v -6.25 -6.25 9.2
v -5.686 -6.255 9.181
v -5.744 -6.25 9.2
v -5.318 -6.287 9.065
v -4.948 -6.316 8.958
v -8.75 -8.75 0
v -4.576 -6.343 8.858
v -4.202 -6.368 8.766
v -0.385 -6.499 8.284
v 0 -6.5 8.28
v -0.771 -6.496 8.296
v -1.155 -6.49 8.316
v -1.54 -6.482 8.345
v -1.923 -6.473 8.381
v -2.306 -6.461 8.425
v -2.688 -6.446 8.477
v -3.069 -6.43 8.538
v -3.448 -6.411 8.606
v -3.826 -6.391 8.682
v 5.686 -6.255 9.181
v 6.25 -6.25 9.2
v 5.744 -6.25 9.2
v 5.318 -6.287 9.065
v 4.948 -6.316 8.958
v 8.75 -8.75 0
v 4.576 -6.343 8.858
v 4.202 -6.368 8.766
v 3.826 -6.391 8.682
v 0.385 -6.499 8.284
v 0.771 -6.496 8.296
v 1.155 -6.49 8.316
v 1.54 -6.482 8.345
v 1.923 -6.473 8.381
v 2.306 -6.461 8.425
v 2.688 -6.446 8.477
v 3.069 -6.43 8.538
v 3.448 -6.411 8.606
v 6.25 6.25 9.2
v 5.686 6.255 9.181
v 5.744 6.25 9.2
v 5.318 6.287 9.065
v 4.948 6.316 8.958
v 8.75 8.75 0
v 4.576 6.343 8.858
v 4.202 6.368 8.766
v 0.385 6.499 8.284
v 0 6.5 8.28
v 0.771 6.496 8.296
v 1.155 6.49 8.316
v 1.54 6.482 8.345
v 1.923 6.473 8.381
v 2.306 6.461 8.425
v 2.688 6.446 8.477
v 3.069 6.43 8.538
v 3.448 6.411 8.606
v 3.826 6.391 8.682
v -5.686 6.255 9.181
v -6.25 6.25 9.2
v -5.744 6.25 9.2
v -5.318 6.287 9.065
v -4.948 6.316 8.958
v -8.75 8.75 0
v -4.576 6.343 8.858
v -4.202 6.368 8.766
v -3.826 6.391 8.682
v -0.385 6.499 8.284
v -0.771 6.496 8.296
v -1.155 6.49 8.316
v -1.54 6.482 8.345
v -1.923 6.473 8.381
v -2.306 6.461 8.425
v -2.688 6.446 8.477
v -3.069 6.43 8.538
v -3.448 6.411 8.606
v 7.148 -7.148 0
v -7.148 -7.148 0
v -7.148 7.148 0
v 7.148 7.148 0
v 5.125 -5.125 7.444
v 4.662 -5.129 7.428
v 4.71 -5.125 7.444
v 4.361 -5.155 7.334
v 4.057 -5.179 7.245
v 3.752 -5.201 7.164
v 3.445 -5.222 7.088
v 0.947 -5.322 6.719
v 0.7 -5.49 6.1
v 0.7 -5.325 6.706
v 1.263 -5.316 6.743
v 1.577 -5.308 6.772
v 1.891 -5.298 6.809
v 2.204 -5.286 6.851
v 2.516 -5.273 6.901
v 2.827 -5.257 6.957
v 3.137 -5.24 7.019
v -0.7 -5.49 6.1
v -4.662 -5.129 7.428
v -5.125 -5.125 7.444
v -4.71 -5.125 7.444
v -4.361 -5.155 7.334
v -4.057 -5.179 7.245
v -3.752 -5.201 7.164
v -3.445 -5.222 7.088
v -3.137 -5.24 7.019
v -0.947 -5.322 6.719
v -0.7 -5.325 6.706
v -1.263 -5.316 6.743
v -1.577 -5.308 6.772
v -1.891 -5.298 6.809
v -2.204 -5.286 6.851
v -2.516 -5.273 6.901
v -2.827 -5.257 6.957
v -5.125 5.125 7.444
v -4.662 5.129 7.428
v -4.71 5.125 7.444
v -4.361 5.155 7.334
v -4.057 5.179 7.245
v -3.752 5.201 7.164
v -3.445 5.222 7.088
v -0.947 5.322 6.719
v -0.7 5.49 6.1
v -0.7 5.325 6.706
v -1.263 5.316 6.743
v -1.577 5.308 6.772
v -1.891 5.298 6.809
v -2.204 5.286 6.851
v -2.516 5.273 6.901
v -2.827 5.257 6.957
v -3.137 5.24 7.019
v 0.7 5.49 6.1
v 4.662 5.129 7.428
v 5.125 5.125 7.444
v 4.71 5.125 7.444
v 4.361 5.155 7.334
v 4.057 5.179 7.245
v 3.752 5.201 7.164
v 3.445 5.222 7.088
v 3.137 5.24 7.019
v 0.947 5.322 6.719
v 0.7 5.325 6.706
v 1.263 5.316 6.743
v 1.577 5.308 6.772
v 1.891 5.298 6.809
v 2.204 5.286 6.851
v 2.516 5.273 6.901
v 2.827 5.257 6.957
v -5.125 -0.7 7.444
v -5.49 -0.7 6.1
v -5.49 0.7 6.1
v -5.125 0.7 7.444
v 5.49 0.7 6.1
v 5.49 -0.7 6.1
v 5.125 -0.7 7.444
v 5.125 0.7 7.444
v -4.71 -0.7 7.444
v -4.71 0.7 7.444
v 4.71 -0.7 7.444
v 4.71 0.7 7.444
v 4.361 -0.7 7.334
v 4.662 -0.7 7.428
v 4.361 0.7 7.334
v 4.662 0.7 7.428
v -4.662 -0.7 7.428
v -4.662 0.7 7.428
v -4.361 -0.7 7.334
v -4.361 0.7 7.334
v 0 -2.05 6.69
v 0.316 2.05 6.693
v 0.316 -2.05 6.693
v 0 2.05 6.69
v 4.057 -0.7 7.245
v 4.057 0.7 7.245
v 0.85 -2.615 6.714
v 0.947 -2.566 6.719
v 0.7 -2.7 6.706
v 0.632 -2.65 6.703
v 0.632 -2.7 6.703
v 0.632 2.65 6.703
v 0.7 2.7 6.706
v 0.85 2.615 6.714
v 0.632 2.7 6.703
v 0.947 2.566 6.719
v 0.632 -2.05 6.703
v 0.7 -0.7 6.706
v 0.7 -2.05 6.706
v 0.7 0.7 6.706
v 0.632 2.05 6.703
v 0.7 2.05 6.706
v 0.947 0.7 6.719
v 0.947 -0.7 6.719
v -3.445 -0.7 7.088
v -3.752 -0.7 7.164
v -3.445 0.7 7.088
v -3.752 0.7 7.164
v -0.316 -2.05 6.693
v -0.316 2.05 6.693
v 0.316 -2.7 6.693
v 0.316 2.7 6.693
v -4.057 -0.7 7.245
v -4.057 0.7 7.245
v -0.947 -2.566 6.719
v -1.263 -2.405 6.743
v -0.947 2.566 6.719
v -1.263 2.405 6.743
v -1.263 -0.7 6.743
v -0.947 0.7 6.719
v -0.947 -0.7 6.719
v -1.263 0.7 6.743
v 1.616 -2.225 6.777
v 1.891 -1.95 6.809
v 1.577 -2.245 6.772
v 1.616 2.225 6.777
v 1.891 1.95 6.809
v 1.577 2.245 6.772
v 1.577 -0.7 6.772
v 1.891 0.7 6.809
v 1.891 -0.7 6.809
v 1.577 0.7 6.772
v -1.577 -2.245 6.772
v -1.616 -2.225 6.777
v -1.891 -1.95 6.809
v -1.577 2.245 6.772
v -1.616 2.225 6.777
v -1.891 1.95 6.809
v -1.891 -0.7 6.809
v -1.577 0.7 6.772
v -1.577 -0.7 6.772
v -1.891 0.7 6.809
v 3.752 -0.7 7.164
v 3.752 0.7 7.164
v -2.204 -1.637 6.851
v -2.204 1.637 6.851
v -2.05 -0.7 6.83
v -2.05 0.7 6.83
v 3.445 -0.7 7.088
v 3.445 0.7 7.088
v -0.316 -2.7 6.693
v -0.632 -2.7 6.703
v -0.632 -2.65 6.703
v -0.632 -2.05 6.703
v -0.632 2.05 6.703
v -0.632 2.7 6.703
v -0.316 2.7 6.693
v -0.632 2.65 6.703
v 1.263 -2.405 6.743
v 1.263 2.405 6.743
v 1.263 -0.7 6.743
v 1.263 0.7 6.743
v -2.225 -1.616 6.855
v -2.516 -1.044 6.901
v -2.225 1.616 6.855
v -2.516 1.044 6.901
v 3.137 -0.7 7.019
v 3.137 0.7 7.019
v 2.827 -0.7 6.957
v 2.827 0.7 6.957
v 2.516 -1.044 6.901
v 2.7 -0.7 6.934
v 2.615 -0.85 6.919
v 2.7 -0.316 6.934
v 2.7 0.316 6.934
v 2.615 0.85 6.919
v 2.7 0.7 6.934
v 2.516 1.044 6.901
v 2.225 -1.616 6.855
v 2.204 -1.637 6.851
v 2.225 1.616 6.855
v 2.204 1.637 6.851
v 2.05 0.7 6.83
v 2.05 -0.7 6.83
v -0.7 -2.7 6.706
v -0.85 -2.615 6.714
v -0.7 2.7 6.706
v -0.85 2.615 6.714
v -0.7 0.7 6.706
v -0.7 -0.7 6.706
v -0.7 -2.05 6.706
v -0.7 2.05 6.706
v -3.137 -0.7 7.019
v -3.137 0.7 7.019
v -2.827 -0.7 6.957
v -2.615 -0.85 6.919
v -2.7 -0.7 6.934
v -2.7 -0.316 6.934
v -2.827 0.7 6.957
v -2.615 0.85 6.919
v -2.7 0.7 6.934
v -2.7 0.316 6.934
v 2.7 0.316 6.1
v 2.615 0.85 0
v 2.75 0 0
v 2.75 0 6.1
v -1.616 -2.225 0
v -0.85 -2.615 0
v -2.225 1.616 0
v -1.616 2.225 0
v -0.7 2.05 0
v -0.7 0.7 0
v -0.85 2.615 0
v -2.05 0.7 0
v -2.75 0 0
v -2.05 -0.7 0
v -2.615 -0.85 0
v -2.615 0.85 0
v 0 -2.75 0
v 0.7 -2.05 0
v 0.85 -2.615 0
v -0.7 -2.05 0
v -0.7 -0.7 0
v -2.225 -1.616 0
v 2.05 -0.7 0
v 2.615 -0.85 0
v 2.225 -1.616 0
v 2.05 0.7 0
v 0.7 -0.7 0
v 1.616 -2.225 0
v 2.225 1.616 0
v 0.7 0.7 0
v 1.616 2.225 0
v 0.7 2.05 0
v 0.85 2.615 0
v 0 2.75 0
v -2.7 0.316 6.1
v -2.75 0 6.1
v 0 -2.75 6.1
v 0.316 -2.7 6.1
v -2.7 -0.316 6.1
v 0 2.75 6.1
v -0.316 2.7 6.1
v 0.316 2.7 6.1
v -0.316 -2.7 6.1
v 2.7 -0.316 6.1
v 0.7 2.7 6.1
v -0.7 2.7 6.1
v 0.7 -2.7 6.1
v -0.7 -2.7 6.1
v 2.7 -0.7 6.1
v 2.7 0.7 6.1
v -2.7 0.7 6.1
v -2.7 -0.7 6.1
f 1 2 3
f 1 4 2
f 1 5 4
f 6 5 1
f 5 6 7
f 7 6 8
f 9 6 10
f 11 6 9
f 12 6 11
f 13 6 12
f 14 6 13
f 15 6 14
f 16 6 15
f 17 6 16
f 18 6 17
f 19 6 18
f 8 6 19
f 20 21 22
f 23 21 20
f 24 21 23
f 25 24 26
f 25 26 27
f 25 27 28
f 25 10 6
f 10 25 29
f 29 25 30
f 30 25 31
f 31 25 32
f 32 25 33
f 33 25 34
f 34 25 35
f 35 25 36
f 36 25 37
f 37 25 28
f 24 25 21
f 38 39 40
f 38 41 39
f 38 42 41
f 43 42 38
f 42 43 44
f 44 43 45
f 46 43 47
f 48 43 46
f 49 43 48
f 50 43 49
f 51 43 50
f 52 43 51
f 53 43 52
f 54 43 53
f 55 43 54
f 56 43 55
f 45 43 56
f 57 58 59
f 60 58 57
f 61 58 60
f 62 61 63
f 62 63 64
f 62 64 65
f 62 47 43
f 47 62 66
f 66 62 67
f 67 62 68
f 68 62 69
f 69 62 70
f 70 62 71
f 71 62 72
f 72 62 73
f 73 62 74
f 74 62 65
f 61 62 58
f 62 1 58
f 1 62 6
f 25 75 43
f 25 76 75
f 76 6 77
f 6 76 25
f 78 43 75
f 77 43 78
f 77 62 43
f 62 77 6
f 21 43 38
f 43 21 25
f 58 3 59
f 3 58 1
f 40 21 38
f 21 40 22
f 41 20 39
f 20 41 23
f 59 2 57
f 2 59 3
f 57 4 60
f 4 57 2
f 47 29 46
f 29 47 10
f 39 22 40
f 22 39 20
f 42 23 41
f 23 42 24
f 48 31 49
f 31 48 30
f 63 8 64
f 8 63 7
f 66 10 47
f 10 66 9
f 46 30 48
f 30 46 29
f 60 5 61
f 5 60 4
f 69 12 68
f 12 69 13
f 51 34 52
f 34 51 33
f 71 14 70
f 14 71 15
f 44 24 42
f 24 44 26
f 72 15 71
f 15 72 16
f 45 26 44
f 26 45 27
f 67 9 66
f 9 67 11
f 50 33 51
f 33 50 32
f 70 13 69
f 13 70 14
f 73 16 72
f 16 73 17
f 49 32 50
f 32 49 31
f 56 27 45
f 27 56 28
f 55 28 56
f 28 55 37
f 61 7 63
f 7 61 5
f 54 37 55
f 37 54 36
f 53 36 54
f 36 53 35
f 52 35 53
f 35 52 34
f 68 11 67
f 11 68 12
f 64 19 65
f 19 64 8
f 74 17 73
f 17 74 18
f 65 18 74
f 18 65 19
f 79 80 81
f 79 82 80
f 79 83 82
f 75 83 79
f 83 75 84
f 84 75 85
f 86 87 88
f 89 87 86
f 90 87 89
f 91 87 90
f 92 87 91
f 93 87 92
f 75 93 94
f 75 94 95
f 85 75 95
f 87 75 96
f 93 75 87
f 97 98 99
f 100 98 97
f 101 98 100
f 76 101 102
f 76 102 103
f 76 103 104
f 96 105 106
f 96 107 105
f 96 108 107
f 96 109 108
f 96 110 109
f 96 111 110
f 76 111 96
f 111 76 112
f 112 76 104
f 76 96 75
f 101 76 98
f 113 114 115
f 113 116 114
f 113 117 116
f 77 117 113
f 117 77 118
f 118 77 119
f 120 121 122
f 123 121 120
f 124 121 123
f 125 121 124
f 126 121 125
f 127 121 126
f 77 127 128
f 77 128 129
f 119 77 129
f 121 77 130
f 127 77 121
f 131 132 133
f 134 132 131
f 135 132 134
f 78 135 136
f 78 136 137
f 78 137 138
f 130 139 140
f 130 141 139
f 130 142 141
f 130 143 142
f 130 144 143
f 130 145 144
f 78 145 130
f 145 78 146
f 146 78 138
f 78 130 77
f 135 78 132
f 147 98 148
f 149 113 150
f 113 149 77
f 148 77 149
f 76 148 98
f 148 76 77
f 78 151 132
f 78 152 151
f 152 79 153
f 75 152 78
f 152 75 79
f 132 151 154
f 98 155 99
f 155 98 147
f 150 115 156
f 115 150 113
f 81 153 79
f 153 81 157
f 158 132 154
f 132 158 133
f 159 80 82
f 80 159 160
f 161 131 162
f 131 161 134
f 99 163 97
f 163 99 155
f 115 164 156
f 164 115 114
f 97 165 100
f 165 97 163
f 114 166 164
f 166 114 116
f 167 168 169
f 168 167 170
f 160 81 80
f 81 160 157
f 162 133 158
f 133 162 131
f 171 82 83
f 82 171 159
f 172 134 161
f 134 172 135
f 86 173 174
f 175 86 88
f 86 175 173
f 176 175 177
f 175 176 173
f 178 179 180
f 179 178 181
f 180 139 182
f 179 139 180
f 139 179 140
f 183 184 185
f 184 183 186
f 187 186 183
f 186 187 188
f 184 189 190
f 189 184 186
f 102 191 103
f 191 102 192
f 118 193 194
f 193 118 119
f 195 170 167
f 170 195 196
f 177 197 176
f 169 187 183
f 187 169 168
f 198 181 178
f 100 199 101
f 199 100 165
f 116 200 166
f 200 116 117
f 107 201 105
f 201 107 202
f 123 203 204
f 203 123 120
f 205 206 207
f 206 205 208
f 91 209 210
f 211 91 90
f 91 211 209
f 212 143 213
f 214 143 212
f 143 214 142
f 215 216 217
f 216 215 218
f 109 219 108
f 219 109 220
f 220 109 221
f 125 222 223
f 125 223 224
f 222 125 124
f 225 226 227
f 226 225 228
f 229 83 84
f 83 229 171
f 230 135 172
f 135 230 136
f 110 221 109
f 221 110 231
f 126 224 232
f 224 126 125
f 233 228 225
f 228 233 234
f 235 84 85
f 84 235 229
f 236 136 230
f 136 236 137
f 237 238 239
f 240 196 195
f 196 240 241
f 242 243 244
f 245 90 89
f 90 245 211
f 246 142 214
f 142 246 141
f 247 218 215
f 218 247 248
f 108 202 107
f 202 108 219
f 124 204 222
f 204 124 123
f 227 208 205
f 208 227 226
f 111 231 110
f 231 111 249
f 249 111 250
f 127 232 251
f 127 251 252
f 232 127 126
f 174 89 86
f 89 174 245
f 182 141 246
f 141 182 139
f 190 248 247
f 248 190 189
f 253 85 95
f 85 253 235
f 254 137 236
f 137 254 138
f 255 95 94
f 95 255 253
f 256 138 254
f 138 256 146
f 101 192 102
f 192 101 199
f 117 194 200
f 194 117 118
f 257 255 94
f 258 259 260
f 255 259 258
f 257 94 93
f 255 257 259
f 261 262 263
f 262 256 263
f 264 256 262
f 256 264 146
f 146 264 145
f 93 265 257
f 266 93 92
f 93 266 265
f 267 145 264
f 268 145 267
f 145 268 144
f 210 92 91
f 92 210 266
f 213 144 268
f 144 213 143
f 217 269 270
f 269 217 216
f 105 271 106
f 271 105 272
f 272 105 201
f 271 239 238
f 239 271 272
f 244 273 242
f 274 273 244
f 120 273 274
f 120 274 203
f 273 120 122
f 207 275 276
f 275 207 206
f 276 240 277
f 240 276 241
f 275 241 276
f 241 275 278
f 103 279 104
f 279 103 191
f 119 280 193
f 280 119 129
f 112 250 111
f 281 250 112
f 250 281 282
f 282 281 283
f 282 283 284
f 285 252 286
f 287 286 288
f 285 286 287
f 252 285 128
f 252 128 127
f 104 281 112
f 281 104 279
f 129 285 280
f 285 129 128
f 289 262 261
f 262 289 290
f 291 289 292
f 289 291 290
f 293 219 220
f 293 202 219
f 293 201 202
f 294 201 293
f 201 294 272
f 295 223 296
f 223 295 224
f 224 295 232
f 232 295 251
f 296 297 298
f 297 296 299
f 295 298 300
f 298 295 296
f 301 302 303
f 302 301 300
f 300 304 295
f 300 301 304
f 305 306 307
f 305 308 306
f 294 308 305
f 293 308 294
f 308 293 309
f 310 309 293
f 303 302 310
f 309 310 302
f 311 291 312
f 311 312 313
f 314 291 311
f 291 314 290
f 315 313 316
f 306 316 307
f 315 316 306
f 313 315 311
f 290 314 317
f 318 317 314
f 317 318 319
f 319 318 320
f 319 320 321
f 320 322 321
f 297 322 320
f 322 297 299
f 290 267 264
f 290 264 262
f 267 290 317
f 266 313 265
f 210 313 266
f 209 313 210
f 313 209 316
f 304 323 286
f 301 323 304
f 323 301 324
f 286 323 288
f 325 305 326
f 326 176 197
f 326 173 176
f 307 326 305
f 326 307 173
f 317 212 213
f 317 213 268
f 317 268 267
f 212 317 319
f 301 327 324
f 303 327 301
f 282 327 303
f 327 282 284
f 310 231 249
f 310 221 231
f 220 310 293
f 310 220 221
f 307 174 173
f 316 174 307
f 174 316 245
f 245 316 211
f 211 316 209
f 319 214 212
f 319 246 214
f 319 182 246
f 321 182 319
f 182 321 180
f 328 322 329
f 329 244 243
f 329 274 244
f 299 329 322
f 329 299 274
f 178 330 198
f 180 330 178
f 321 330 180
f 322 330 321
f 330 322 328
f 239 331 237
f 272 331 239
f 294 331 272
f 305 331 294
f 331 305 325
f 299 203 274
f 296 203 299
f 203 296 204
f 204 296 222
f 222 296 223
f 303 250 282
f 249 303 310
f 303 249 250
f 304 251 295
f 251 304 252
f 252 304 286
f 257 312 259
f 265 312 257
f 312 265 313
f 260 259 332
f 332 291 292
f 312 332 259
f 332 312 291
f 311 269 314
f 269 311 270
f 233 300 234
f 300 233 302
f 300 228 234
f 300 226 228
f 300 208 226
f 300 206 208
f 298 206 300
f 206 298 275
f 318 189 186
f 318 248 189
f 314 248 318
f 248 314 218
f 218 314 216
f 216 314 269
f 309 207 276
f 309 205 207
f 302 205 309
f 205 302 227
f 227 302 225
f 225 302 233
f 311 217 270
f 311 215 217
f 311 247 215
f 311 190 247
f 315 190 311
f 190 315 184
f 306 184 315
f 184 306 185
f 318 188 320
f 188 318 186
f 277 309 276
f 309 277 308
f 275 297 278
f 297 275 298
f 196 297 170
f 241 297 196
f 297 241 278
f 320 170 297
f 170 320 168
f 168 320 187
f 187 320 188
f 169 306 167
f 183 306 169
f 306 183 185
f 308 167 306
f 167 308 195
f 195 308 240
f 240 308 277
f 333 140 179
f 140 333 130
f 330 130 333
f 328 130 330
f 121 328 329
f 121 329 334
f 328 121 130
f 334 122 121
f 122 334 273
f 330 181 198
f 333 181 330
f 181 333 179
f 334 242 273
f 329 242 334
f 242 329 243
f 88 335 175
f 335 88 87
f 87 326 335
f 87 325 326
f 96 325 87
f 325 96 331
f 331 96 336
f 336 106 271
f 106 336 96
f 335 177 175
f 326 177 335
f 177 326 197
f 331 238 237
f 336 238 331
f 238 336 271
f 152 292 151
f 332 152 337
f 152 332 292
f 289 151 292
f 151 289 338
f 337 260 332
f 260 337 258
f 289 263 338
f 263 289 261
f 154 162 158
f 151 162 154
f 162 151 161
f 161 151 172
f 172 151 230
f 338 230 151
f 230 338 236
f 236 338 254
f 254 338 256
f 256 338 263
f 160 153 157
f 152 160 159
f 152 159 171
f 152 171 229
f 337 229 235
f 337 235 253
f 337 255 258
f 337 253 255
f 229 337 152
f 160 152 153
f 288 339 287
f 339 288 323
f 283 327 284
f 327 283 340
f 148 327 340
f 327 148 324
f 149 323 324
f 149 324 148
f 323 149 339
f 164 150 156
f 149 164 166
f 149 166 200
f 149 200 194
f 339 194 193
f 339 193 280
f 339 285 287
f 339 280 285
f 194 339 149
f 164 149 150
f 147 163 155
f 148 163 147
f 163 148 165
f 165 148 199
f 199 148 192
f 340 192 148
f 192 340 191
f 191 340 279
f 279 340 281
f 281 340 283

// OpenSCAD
height = 9.2;
top_side = 12.5;
bottom_side = 17.5;
corner_diameter = 2;
stem_diameter=5.5;
inner_hollow_scale = 0.82;

// I'm printing in my local library and don't have access to printer settings,
// So I have modified slots a little bit to make them tighter.
// Original dimensions were [4.2,1.5,40]
slot_length = 4.1;
slot_width = 1.4;
slots = [[slot_length,slot_width, inner_hollow_scale*height], [slot_width,slot_length, inner_hollow_scale*height]];

check_cubes(all=false, top=false, bottom=false, wall=false);

// sharp, postsoft, presoft
style = "sharp";


corner_offset = corner_diameter * sqrt(2);

cone_top_diameter = circumscribed_circle(top_side) - corner_offset;
cone_bottom_diameter = circumscribed_circle(bottom_side) - corner_offset;

// cap
difference() {
    keycap();
    translate([0, 0, -0.1]) scale(inner_hollow_scale) keycap();
}

// stem
difference() {
    cylinder(inner_hollow_scale*height, d=stem_diameter, $fn=20);
    translate([0,0, inner_hollow_scale*height/2-0.1]) cube(slots[0], center=true);
    translate([0,0, inner_hollow_scale*height/2-0.1]) cube(slots[1], center=true);
}
// struts
translate([0, 4.6, 6.8]) cube([slot_width, 3.8, slot_width], center=true);
translate([0, -4.6, 6.8]) cube([slot_width, 3.8, slot_width], center=true);
translate([4.6, 0, 6.8]) cube([3.8, slot_width, slot_width], center=true);
translate([-4.6, 0, 6.8]) cube([3.8, slot_width, slot_width], center=true);



module keycap() {
    // sharp
    if (style=="sharp") {
        difference() {
                rotate([0, 0, 45]) cylinder(height,d2=circumscribed_circle(top_side), d1=circumscribed_circle(bottom_side), $fn=4);
                translate([0, 0, 2.9*height]) rotate([90, 90, 0]) cylinder(bottom_side,r=2*height, $fn=300, center=true);
        }
    }

    // post soft
    if (style=="postsoft") {
        minkowski() {
            difference() {
                compensation = sqrt(2) * corner_diameter;
                translate([0, 0, corner_diameter/2]) rotate([0, 0, 45]) cylinder(
                    height - corner_diameter,
                    d2=circumscribed_circle(top_side) - compensation,
                    d1=circumscribed_circle(bottom_side) - compensation,
                    $fn=4
                );
                translate([0, 0, 2.805*height]) rotate([90, 90, 0]) cylinder(bottom_side,r=2*height, $fn=300, center=true);
            }    
            sphere(d=corner_diameter, $fn=50);
        }
    }

    // pre soft
    if (style=="presoft") {
        difference() {
            minkowski() {
                rotate([0, 0, 45]) cylinder(height,d1=cone_bottom_diameter,d2=cone_top_diameter,$fn=4);
                cylinder(0.01,d=corner_diameter,$fn=50);                
            };
            translate([0, 0, 2.9*height]) rotate([90, 90, 0]) cylinder(bottom_side,r=2*height, $fn=300, center=true);
        } 
    }
}

module check_cubes(all=false, bottom=false, top=false, wall=false) {
    // Dimensions check cubes
    if (all || bottom) {
        color("Red") { translate([-bottom_side/2, 0, 0]) cube([bottom_side, bottom_side, height]); }
    }
    if (all || top) {
        color("Green") { translate([-top_side/2, -top_side/2, 0]) cube([top_side, top_side, height]); }
    }
    if (all || wall) {
        color("Orange") { translate([bottom_side/2, -bottom_side/2, 0]) cube([1.7, 1.7, 1.7]); }
    }
}

function circumscribed_circle(side) = side * sqrt(2);
